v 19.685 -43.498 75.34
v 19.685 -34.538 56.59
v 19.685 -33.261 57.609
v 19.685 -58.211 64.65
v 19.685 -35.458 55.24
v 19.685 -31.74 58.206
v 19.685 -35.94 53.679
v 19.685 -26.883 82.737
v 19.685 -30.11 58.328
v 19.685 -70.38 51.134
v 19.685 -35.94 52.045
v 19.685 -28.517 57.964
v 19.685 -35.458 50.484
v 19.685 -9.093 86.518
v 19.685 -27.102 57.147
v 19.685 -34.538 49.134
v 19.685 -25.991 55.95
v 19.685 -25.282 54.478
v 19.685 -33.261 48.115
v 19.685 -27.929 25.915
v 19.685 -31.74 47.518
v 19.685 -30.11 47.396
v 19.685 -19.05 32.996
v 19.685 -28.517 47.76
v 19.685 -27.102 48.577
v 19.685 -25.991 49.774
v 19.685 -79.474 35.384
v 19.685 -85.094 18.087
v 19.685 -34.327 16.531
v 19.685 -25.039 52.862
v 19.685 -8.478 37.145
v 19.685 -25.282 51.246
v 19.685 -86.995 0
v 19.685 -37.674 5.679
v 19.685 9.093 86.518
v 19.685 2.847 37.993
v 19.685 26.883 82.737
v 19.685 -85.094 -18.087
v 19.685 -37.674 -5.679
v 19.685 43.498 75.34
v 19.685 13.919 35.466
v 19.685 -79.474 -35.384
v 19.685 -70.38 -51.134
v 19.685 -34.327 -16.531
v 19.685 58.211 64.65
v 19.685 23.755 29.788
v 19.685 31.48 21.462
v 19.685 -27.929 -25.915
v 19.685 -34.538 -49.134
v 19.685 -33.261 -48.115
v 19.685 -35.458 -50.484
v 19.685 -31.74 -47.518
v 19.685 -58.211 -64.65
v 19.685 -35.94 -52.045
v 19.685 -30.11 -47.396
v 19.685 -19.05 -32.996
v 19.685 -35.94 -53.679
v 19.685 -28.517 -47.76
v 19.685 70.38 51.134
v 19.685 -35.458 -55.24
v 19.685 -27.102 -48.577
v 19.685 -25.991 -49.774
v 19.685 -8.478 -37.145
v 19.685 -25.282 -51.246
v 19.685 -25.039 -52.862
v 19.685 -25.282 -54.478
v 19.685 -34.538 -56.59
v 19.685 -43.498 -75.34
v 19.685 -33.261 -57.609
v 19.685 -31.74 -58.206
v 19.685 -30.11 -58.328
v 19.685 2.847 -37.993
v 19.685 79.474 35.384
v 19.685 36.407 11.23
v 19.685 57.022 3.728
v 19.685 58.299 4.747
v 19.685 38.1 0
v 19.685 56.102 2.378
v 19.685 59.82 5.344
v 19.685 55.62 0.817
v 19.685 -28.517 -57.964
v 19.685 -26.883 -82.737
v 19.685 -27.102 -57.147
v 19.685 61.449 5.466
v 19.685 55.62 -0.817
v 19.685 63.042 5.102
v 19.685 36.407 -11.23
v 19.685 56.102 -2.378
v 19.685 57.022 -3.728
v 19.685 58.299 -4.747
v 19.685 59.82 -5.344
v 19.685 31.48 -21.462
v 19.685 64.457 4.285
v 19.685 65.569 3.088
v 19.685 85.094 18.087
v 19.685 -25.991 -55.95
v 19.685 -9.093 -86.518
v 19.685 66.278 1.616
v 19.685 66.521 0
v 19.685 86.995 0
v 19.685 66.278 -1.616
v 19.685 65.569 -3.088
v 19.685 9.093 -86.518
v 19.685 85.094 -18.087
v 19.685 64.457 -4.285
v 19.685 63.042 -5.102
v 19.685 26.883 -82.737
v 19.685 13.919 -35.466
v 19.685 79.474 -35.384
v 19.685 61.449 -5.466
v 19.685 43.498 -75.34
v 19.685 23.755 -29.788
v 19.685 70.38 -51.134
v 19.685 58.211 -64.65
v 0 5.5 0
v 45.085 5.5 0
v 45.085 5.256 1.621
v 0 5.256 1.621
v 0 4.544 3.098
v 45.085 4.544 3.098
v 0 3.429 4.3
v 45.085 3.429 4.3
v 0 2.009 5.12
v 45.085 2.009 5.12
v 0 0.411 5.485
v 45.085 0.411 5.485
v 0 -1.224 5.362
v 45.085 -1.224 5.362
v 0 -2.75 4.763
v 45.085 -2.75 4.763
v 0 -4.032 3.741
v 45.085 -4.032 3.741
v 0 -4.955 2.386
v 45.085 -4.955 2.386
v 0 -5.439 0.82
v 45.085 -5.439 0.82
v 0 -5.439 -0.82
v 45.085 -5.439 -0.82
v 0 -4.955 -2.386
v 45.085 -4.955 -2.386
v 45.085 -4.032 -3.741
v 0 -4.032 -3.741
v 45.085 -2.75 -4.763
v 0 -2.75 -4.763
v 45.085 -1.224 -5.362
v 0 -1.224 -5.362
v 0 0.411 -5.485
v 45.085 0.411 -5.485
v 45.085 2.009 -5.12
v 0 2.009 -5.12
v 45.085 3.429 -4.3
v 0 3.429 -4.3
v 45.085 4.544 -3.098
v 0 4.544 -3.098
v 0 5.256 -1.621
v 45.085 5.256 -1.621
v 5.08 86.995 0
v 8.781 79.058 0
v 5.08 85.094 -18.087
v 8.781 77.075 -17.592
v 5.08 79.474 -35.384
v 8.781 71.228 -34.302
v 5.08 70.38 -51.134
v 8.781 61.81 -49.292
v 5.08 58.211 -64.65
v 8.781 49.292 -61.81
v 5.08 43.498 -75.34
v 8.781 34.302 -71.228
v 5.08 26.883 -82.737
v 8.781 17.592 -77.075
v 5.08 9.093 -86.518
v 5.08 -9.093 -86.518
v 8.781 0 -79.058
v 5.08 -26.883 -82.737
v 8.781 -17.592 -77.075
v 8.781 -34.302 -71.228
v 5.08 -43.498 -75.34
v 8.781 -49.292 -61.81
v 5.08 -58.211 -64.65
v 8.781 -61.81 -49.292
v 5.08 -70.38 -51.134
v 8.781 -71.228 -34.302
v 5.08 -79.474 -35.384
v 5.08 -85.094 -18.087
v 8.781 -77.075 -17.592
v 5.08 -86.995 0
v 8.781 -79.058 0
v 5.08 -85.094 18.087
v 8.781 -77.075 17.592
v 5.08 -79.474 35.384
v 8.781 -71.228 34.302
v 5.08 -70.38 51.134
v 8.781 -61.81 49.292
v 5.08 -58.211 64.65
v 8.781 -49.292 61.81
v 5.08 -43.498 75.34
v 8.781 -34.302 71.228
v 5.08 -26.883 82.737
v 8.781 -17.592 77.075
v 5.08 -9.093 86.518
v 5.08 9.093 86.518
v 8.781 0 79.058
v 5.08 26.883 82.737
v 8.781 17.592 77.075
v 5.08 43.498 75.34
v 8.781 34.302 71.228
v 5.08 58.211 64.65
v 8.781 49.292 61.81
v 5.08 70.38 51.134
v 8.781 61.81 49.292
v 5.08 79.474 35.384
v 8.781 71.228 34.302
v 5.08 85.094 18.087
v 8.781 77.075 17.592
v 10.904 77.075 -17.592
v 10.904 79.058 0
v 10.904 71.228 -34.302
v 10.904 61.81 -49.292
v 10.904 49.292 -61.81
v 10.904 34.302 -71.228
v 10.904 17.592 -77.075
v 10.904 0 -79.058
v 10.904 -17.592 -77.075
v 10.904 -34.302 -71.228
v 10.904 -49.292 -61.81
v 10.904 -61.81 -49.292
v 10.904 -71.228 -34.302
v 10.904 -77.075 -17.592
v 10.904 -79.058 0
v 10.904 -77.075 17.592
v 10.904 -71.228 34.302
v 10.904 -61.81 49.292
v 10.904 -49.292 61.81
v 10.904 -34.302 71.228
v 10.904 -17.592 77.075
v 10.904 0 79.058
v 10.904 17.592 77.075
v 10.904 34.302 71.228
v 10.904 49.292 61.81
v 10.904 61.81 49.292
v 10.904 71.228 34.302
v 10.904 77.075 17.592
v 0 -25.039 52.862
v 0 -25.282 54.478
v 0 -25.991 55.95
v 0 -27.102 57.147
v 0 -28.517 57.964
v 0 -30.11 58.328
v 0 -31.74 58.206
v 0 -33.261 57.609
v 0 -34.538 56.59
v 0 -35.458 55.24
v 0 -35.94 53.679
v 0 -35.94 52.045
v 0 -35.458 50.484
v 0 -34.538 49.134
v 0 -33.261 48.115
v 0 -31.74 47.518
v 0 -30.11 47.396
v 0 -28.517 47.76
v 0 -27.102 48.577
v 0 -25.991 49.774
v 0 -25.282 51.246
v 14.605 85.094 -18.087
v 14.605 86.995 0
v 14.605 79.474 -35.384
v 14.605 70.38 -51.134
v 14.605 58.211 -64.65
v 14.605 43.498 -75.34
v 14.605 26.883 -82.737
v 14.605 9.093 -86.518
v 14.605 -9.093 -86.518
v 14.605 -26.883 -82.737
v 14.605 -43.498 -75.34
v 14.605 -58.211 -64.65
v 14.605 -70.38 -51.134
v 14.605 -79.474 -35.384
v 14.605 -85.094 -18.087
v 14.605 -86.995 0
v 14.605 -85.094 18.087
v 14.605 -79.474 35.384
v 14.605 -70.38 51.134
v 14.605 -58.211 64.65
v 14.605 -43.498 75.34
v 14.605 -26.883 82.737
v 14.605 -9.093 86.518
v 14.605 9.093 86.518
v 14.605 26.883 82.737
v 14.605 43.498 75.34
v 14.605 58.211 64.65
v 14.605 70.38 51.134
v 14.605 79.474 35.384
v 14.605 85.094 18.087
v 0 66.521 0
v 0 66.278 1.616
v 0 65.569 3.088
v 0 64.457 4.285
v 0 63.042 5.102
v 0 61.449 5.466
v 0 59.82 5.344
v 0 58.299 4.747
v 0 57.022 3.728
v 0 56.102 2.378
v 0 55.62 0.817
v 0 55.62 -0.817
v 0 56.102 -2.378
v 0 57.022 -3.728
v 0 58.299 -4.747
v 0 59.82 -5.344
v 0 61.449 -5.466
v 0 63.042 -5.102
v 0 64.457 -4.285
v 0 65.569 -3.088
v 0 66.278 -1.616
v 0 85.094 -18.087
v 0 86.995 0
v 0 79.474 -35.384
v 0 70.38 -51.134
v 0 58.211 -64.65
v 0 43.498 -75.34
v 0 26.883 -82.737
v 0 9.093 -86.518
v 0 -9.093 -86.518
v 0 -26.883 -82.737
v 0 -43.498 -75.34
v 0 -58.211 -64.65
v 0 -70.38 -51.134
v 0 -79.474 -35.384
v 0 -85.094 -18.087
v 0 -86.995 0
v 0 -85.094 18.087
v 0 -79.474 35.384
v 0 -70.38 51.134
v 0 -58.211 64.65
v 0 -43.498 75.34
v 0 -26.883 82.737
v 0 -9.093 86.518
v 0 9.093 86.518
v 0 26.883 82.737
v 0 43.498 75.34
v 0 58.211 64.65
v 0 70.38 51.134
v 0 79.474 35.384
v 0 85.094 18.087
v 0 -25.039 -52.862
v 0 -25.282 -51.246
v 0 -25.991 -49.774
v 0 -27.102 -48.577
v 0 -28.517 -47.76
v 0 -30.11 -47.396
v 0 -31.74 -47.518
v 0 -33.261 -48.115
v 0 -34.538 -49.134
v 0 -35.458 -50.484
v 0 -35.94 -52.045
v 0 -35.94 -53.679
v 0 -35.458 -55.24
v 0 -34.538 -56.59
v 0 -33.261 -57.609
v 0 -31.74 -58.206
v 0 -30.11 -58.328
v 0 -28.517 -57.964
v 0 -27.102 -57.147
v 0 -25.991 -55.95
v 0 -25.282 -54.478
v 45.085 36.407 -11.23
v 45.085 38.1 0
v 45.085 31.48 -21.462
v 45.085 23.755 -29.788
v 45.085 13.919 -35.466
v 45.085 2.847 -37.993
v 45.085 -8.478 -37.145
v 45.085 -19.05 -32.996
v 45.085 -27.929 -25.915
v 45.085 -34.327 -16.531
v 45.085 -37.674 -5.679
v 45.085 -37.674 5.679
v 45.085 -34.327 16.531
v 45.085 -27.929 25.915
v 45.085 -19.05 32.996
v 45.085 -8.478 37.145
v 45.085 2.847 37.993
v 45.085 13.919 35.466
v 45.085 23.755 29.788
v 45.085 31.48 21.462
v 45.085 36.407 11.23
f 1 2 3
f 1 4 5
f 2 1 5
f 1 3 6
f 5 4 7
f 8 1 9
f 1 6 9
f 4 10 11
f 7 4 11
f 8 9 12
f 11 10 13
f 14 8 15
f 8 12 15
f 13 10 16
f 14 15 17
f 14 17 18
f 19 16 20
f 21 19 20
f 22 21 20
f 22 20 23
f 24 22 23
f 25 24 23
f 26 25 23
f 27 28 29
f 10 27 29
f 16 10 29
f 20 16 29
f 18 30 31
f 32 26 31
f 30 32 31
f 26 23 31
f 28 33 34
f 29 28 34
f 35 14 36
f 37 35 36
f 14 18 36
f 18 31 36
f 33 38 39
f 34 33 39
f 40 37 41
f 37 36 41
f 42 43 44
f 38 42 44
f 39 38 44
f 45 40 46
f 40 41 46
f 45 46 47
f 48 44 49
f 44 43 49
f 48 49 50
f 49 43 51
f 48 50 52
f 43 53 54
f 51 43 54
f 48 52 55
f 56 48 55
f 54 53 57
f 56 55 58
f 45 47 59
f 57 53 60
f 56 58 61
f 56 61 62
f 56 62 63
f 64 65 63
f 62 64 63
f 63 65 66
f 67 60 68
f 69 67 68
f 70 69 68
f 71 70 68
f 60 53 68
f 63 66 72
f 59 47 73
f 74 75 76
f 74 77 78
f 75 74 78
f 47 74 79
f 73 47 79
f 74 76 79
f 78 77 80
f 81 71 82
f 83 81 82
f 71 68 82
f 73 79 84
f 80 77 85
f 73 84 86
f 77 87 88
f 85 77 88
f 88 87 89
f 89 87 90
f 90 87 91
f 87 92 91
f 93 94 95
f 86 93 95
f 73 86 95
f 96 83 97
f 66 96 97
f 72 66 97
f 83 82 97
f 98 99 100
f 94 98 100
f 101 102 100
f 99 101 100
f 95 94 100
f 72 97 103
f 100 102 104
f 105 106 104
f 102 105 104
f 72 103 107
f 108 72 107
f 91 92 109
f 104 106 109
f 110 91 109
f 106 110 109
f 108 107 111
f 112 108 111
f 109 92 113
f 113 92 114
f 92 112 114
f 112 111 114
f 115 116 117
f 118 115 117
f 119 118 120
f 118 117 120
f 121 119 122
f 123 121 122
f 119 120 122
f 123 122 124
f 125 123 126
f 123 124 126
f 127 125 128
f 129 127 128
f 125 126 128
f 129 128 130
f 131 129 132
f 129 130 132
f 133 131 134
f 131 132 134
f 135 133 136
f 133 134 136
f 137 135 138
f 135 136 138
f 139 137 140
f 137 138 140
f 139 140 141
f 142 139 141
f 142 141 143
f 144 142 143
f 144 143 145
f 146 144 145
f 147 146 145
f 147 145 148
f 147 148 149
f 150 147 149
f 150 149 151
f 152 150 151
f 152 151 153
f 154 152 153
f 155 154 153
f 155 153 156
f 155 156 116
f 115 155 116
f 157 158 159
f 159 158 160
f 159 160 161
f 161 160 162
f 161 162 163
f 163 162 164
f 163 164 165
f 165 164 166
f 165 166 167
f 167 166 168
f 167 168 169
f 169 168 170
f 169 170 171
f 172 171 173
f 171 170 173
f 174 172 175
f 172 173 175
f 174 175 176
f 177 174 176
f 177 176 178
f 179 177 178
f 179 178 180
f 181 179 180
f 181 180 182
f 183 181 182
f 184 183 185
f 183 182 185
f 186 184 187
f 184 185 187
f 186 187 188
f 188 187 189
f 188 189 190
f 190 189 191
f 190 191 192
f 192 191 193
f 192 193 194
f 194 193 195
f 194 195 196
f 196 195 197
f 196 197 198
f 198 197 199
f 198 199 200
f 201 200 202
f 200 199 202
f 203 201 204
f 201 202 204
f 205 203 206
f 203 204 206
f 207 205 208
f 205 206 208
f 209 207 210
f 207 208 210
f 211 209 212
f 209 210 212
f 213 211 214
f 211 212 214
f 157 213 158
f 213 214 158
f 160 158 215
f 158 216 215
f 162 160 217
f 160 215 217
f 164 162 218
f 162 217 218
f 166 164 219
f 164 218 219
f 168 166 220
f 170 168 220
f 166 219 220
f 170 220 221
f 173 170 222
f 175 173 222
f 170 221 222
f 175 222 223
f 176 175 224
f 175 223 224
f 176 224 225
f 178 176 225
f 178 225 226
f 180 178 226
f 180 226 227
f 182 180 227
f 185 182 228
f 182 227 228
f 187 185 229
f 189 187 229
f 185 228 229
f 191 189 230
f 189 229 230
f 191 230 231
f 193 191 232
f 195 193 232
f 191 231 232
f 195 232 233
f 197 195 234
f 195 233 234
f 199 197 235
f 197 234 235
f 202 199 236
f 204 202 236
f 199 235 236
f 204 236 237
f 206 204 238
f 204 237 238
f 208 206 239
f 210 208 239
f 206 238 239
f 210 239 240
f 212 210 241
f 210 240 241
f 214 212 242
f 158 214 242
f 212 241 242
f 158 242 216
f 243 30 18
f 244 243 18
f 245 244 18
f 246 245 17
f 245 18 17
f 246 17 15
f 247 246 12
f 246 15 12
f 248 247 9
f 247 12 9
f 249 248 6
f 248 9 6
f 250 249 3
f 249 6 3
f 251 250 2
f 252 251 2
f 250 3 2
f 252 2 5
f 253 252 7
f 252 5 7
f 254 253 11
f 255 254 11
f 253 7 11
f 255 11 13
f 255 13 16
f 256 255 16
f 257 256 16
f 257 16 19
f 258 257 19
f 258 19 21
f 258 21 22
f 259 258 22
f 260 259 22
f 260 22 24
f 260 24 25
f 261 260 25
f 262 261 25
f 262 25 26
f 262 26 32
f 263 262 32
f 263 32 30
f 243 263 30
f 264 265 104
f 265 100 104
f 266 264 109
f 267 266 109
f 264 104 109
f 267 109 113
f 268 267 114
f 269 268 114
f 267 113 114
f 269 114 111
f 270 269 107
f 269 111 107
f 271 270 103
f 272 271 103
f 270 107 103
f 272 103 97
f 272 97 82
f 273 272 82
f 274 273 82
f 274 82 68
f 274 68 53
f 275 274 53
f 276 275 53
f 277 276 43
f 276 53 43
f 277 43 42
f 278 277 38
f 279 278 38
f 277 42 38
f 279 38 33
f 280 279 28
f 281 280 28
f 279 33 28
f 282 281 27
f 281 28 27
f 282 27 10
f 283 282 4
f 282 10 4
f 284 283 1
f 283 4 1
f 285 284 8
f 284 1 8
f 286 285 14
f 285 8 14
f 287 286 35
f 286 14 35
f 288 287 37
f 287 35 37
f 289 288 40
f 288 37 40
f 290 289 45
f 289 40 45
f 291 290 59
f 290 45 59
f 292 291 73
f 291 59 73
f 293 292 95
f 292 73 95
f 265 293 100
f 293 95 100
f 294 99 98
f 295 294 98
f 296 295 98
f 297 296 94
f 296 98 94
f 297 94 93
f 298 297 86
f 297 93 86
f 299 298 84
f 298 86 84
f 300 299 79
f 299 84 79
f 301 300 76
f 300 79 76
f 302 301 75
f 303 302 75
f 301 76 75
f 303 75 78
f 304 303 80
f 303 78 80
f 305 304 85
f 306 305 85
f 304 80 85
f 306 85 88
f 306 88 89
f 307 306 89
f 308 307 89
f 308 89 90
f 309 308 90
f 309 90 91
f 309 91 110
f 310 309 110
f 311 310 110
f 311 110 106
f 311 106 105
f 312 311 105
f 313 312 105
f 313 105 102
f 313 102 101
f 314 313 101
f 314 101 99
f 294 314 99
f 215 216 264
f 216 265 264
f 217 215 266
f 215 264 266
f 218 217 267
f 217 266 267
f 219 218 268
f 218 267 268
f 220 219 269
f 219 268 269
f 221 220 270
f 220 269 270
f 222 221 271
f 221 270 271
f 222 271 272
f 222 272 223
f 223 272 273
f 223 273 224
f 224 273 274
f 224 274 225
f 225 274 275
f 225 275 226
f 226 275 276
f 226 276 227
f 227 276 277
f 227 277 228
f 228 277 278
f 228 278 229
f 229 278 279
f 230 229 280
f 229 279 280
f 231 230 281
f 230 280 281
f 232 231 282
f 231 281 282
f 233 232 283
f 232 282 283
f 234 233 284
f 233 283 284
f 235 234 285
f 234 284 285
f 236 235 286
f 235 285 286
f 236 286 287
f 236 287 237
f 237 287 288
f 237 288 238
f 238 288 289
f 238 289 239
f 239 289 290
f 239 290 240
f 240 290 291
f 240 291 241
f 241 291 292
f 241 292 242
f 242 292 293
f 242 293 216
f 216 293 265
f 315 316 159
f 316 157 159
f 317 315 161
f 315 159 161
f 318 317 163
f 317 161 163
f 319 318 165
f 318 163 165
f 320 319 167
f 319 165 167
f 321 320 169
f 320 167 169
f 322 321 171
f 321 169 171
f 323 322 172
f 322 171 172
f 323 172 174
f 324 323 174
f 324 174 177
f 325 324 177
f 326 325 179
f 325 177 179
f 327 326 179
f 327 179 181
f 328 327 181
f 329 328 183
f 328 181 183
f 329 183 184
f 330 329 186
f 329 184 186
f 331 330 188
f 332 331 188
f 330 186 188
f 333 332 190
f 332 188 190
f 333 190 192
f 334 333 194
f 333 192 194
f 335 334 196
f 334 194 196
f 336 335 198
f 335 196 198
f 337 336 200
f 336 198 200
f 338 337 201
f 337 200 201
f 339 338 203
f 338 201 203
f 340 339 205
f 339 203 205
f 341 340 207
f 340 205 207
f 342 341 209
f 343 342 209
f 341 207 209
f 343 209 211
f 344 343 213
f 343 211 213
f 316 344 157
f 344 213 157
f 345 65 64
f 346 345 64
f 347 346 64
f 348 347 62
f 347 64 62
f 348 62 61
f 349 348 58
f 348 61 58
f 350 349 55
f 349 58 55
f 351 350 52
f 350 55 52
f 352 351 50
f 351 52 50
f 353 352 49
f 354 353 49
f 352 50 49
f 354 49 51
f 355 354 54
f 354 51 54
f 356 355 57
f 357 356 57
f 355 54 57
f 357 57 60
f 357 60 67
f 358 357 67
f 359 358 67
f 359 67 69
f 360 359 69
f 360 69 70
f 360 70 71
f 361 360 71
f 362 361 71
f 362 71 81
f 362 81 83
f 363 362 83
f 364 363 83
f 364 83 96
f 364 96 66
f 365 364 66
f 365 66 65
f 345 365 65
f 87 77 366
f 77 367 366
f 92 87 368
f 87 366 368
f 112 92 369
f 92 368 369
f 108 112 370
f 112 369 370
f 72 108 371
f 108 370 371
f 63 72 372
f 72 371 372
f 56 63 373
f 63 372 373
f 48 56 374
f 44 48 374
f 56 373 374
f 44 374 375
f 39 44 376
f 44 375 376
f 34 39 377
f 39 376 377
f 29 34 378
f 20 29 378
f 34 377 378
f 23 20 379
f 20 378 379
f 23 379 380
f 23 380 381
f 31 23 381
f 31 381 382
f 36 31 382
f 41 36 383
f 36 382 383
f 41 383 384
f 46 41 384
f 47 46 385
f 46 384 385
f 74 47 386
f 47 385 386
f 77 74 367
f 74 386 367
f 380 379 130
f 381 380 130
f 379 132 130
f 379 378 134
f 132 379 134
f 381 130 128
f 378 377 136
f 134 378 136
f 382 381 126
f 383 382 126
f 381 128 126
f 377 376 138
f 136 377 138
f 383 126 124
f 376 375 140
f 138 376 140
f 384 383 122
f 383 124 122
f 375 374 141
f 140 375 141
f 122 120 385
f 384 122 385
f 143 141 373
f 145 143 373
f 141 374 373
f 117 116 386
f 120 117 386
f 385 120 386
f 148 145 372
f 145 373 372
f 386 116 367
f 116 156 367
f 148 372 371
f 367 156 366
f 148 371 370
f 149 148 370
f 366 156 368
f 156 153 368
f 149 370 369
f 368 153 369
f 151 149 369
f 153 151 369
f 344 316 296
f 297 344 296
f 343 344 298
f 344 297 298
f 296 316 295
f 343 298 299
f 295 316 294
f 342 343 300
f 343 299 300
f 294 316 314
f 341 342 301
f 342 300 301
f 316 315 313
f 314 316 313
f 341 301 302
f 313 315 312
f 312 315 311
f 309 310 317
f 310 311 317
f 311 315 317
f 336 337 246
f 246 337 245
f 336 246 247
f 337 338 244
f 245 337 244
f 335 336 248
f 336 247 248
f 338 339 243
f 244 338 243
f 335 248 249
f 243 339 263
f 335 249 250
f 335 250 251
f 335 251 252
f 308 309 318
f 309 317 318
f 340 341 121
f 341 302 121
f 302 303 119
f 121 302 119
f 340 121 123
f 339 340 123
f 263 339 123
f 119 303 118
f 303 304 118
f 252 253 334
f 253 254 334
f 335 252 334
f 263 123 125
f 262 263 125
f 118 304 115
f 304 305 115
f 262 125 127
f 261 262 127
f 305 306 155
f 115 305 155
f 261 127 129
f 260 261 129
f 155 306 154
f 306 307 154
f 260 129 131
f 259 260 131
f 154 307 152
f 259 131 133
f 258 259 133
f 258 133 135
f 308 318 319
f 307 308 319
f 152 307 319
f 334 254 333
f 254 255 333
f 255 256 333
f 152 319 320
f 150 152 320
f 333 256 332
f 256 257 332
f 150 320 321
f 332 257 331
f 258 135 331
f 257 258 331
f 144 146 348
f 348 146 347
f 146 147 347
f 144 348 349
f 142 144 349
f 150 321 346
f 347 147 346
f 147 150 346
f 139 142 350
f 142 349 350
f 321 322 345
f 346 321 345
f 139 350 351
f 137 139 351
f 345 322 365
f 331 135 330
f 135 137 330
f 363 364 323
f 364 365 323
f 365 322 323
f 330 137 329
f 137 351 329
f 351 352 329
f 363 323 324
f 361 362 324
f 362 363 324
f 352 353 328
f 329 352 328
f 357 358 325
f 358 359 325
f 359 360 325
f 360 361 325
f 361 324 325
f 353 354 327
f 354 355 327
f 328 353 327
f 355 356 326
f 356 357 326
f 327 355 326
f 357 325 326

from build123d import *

# Parameters (mm, degrees)
SKETCH3_R          = 5.5
CUT_EXTRUDE1_DEPTH = 132.030215122
SKETCH4_R          = 5.481177192
CUT_EXTRUDE2_DEPTH = 126.624122086


with BuildPart() as part:
    # Sketch2 → Revolve1 (revolve)
    with BuildSketch(Plane.XY):
        Polygon((0, 0), (0, 86.995), (5.08, 86.995), (8.781317037, 79.0575), (10.903682963, 79.0575), (14.605, 86.995), (19.685, 86.995), (19.685, 38.1), (45.085, 38.1), (45.085, 0), align=None)
    revolve(axis=Axis((45.085, 0, 0), (-1, 0, 0)))

    # Sketch3 → Cut-Extrude1 (cut, through all)
    with BuildSketch(Plane(origin=(45.085, 0, 0), x_dir=(0, 0, -1), z_dir=(1, 0, 0))):
        with Locations(Location((0, 0, 0), (0, 0, 90))):
            Circle(SKETCH3_R)
    extrude(amount=-CUT_EXTRUDE1_DEPTH, mode=Mode.SUBTRACT)

    # Sketch4 → Cut-Extrude2 (cut, through all)
    with BuildSketch(Plane(origin=(19.685, 0, 0), x_dir=(0, 0, -1), z_dir=(1, 0, 0))):
        with Locations(Location((0, 61.039888565, 0), (0, 0, 90))):
            Circle(SKETCH4_R)
        with Locations(Location((52.862094142, -30.519944283, 0), (0, 0, 90))):
            Circle(SKETCH4_R)
        with Locations(Location((-52.862094142, -30.519944283, 0), (0, 0, 90))):
            Circle(SKETCH4_R)
    extrude(amount=-CUT_EXTRUDE2_DEPTH, mode=Mode.SUBTRACT)


solid = part.part
